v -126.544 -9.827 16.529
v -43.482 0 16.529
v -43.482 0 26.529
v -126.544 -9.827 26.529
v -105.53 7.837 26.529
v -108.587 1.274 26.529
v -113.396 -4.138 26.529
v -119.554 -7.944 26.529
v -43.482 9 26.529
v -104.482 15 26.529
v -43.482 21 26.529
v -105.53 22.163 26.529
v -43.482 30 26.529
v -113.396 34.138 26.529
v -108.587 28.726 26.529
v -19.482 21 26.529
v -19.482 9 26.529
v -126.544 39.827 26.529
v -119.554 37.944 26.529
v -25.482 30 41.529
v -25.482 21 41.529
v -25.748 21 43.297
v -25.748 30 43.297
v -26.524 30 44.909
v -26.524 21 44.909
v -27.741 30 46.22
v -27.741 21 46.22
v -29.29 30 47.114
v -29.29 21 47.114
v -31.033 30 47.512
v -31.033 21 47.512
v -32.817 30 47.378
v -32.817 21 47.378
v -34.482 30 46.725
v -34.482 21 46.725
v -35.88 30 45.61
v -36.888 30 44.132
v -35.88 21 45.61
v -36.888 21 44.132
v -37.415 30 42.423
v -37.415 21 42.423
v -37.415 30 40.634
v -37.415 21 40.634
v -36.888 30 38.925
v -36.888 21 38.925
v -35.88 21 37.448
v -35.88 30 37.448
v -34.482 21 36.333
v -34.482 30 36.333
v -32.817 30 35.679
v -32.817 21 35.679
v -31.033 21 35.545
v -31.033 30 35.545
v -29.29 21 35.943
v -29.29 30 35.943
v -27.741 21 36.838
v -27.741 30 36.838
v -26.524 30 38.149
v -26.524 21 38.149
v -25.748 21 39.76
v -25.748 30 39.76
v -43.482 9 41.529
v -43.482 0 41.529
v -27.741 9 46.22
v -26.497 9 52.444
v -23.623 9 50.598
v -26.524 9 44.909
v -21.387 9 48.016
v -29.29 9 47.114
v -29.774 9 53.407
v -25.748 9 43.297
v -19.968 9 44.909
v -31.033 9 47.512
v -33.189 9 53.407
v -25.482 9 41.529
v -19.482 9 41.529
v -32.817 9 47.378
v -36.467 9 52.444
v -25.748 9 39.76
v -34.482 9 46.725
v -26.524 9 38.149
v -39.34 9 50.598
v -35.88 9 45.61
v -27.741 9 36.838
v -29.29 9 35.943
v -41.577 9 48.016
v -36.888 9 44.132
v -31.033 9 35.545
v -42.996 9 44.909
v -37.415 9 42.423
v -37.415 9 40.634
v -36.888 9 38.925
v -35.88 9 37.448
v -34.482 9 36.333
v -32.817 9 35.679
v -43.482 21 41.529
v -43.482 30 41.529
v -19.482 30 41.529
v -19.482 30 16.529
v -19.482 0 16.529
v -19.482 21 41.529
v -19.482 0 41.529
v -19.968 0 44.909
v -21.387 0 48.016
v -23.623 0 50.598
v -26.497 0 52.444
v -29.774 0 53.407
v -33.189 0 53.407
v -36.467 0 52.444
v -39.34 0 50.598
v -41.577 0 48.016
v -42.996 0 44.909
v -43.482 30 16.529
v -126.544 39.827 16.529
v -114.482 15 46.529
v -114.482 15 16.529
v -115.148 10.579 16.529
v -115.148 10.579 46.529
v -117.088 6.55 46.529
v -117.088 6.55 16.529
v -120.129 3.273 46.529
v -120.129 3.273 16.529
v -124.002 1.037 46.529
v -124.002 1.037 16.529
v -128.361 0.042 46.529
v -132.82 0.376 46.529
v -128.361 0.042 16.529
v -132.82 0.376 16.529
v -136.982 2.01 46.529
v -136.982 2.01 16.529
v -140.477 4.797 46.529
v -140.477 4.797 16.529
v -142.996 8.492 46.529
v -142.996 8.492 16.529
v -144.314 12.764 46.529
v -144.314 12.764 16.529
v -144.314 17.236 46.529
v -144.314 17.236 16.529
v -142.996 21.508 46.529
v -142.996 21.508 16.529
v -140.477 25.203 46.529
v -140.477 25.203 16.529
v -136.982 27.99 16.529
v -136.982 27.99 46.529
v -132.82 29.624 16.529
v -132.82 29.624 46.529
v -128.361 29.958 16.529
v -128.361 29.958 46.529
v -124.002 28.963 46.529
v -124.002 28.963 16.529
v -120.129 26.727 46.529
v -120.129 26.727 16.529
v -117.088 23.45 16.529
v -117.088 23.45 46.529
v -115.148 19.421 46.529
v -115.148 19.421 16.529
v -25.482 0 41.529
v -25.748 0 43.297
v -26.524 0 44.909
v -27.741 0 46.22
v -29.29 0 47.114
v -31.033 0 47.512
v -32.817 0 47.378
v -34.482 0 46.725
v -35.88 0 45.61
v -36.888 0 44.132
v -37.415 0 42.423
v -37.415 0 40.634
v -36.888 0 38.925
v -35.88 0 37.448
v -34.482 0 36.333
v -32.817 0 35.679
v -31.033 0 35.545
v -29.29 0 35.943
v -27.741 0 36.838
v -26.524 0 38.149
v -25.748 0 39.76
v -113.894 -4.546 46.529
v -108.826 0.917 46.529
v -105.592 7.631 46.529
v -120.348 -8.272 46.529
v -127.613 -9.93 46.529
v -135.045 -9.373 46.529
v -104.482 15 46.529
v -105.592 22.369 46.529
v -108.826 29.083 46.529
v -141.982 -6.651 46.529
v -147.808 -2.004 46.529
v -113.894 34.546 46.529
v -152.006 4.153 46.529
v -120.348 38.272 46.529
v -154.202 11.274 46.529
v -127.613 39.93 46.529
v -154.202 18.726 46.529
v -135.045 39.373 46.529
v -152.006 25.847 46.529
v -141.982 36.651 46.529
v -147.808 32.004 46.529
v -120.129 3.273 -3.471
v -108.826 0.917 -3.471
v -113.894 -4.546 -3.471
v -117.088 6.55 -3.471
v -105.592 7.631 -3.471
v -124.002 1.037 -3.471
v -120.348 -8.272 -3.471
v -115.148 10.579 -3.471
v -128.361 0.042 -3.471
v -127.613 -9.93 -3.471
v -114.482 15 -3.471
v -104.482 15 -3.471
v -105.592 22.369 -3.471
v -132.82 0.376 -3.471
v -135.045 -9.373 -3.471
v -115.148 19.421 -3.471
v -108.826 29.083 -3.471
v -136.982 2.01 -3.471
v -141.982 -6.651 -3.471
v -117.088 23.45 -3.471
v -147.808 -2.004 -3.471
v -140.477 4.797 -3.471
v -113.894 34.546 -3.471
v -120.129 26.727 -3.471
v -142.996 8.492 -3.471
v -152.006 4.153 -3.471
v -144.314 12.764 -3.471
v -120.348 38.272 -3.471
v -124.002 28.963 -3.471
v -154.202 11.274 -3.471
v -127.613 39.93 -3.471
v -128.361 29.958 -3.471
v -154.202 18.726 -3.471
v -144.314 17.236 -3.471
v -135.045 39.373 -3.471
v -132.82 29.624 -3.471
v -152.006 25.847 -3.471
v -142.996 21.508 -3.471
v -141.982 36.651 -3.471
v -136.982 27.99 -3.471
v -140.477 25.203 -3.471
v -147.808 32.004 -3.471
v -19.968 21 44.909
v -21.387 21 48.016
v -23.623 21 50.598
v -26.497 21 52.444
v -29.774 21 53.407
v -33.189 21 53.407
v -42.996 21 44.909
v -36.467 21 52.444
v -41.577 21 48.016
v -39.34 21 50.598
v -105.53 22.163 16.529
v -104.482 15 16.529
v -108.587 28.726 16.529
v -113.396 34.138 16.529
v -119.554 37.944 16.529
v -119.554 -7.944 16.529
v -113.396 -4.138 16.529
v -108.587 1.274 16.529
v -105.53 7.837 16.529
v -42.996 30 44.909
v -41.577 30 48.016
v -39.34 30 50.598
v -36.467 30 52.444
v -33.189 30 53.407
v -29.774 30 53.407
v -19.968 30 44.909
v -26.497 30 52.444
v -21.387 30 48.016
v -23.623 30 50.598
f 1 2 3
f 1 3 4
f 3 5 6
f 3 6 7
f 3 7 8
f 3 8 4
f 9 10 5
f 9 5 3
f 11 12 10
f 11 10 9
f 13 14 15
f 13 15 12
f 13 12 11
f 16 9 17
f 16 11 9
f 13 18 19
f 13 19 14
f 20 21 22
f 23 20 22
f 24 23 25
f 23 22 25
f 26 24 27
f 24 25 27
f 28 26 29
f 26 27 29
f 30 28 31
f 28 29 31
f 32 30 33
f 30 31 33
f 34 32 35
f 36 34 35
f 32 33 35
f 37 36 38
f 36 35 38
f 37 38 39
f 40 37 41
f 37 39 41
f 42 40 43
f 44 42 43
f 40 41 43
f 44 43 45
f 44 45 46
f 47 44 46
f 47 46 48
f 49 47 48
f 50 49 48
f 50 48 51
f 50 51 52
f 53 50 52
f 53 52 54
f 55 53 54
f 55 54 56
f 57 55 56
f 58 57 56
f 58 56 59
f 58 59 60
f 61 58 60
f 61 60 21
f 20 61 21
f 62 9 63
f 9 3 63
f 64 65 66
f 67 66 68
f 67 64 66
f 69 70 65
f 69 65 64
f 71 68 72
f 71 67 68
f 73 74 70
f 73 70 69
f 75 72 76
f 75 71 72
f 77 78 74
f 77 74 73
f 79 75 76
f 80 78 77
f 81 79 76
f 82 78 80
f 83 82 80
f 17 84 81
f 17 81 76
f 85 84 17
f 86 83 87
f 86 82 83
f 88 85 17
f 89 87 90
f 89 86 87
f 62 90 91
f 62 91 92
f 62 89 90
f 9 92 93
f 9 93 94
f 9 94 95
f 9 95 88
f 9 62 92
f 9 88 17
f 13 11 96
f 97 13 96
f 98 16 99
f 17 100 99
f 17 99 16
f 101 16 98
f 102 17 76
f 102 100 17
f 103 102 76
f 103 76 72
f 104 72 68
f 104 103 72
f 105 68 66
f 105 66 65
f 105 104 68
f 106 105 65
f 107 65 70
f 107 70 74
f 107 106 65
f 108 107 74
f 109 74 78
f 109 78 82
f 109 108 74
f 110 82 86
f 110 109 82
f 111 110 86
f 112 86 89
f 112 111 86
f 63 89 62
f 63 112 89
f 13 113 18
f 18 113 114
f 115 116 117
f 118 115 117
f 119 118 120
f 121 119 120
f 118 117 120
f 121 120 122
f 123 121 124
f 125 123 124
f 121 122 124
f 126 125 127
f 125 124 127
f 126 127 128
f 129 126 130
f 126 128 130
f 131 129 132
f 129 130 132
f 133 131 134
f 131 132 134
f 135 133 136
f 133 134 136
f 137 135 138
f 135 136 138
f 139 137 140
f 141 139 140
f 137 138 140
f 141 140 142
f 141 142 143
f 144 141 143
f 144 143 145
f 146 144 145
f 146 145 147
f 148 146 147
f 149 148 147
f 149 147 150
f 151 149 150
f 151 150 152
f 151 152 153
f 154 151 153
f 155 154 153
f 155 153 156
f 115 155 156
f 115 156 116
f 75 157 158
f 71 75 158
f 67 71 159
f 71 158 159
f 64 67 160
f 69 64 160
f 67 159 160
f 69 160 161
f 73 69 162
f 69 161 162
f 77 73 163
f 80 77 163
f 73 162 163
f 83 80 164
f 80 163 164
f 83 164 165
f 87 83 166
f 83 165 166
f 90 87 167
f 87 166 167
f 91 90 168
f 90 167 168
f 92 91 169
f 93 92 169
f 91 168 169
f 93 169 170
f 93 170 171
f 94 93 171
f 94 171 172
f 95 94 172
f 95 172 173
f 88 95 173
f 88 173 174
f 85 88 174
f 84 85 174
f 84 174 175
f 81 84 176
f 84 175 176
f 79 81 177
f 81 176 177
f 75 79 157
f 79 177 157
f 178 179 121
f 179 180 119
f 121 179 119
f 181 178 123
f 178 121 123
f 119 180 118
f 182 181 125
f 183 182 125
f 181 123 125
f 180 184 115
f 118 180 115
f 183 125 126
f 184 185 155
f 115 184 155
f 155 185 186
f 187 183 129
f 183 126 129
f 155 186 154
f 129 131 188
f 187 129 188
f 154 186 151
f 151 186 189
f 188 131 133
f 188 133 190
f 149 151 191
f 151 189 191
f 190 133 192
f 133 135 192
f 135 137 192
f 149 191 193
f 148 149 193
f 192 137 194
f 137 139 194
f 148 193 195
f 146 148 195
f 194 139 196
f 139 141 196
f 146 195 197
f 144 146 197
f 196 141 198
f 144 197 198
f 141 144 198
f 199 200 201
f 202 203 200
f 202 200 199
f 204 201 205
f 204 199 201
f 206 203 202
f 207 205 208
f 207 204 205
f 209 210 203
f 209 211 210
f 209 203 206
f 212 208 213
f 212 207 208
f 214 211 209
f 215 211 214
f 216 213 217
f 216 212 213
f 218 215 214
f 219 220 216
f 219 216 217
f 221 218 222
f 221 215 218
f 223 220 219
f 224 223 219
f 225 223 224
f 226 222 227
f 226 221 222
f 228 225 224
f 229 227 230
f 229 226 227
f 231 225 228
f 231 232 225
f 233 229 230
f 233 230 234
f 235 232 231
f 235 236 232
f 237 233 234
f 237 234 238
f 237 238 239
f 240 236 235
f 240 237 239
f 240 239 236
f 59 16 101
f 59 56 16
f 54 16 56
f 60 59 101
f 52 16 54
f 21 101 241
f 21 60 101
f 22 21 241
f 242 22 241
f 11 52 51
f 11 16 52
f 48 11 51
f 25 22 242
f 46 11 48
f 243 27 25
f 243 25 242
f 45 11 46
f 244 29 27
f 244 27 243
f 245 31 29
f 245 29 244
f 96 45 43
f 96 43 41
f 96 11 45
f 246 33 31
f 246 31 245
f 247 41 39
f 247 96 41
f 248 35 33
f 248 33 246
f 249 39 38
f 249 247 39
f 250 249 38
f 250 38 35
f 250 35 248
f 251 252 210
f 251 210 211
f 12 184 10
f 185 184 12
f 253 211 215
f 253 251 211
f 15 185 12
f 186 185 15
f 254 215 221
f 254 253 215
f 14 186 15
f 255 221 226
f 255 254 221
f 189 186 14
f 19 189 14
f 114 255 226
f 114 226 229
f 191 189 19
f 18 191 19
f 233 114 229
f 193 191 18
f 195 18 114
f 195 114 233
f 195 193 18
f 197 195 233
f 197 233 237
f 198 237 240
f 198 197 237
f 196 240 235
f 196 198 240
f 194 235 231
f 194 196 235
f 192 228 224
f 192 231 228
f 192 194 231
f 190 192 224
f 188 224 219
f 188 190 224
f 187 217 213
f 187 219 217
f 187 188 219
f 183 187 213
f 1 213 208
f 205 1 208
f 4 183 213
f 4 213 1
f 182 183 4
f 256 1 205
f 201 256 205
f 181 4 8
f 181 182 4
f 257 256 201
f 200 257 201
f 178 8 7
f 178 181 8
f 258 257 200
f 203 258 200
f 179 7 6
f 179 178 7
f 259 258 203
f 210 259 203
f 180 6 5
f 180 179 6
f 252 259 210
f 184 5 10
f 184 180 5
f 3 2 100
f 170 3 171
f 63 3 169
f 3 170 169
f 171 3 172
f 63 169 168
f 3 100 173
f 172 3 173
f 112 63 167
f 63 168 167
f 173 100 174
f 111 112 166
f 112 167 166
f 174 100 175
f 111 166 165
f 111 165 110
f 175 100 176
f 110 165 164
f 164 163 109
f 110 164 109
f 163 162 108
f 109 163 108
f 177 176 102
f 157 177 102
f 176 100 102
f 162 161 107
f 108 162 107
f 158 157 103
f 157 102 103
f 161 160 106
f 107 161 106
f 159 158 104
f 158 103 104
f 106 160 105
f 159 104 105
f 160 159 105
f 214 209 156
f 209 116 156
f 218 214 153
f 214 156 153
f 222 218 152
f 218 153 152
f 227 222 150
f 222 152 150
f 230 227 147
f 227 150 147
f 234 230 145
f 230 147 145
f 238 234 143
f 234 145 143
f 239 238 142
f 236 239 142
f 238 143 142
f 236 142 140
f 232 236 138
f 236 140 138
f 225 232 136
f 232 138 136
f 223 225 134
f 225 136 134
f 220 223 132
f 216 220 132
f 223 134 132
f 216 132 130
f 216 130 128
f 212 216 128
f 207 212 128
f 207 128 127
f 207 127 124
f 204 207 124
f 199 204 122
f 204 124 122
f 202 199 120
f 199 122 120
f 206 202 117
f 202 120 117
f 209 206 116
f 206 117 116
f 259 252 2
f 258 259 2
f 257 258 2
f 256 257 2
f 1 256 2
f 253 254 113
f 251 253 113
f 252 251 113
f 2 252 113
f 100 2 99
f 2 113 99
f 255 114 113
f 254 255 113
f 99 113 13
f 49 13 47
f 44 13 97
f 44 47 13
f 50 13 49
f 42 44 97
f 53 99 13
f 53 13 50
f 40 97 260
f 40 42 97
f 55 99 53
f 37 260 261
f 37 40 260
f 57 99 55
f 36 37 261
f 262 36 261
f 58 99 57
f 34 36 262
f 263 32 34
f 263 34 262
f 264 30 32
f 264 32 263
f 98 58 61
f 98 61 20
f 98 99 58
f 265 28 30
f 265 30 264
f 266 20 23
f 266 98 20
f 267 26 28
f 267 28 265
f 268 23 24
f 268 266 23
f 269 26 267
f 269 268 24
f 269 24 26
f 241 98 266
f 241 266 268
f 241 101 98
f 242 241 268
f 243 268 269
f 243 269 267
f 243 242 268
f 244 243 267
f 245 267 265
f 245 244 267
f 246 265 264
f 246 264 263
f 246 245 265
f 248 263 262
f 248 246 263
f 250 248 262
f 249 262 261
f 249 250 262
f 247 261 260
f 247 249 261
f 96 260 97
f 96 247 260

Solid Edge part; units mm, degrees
sketch "Sketch1" plane through (0, 0, 0) normal (0, -1, 0) x (1, 0, 0)
  line L0 (-43.4817, 16.5287) -> (-43.4817, 41.5287)
  line L1 (-19.4817, 16.5287) -> (-19.4817, 41.5287)
  line L2 (-43.4817, 16.5287) -> (-19.4817, 16.5287)
  arc A0 (-19.4817, 41.5287) -> (-43.4817, 41.5287) centre (-31.4817, 41.5287) ccw
extrude "Protrusion1" add sketch "Sketch1" against normal blind 30
sketch "Sketch2" plane through (0, 0, 0) normal (0, -1, 0) x (1, 0, 0)
  circle A0 centre (-31.4817, 41.5287) radius 6
extrude "ExtrudedCutout_1" cut sketch "Sketch2" against normal blind 30
sketch "Sketch3" plane through (-43.4817, 15, 29.0287) normal (-1, 0, 0) x (0, -1, 0)
  line L0 (6, 12.5) -> (6, -2.5)
  line L1 (6, -2.5) -> (-6, -2.5)
  line L2 (-6, -2.5) -> (-6, 12.5)
  line L3 (-6, 12.5) -> (-6, 28.2339)
  line L4 (6, 28.2339) -> (-6, 28.2339)
  line L5 (6, 12.5) -> (6, 28.2339)
extrude "ExtrudedCutout_2" cut sketch "Sketch3" against normal blind 24
sketch "Sketch4" plane through (-31.4817, 15, 16.5287) normal (0, 0, -1) x (1, 0, 0)
  circle A0 centre (-98, 0) radius 25
extrude "ExtrudedProtrusion_2" add sketch "Sketch4" along normal blind 20
sketch "Sketch5" plane through (-31.4817, 15, 16.5287) normal (0, 0, -1) x (1, 0, 0)
  circle A0 centre (-98, 0) radius 25
extrude "ExtrudedProtrusion_3" add sketch "Sketch5" against normal blind 30
sketch "Sketch6" plane through (-31.4817, 15, 16.5287) normal (0, 0, -1) x (1, 0, 0)
  line L0 (-12, -15) -> (-95.0628, -24.8269)
  line L1 (-95.0628, 24.8269) -> (-95.0628, -24.8269)
  line L2 (-12, 15) -> (-95.0628, 24.8269)
  line L3 (-12, 15) -> (-12, -15)
extrude "Protrusion2" add sketch "Sketch6" against normal blind 10
sketch "Sketch7" plane through (-31.4817, 15, 16.5287) normal (0, 0, -1) x (1, 0, 0)
  circle A0 centre (-98, 0) radius 15
extrude "Cutout1" cut sketch "Sketch7" along normal mid plane 75.5501
